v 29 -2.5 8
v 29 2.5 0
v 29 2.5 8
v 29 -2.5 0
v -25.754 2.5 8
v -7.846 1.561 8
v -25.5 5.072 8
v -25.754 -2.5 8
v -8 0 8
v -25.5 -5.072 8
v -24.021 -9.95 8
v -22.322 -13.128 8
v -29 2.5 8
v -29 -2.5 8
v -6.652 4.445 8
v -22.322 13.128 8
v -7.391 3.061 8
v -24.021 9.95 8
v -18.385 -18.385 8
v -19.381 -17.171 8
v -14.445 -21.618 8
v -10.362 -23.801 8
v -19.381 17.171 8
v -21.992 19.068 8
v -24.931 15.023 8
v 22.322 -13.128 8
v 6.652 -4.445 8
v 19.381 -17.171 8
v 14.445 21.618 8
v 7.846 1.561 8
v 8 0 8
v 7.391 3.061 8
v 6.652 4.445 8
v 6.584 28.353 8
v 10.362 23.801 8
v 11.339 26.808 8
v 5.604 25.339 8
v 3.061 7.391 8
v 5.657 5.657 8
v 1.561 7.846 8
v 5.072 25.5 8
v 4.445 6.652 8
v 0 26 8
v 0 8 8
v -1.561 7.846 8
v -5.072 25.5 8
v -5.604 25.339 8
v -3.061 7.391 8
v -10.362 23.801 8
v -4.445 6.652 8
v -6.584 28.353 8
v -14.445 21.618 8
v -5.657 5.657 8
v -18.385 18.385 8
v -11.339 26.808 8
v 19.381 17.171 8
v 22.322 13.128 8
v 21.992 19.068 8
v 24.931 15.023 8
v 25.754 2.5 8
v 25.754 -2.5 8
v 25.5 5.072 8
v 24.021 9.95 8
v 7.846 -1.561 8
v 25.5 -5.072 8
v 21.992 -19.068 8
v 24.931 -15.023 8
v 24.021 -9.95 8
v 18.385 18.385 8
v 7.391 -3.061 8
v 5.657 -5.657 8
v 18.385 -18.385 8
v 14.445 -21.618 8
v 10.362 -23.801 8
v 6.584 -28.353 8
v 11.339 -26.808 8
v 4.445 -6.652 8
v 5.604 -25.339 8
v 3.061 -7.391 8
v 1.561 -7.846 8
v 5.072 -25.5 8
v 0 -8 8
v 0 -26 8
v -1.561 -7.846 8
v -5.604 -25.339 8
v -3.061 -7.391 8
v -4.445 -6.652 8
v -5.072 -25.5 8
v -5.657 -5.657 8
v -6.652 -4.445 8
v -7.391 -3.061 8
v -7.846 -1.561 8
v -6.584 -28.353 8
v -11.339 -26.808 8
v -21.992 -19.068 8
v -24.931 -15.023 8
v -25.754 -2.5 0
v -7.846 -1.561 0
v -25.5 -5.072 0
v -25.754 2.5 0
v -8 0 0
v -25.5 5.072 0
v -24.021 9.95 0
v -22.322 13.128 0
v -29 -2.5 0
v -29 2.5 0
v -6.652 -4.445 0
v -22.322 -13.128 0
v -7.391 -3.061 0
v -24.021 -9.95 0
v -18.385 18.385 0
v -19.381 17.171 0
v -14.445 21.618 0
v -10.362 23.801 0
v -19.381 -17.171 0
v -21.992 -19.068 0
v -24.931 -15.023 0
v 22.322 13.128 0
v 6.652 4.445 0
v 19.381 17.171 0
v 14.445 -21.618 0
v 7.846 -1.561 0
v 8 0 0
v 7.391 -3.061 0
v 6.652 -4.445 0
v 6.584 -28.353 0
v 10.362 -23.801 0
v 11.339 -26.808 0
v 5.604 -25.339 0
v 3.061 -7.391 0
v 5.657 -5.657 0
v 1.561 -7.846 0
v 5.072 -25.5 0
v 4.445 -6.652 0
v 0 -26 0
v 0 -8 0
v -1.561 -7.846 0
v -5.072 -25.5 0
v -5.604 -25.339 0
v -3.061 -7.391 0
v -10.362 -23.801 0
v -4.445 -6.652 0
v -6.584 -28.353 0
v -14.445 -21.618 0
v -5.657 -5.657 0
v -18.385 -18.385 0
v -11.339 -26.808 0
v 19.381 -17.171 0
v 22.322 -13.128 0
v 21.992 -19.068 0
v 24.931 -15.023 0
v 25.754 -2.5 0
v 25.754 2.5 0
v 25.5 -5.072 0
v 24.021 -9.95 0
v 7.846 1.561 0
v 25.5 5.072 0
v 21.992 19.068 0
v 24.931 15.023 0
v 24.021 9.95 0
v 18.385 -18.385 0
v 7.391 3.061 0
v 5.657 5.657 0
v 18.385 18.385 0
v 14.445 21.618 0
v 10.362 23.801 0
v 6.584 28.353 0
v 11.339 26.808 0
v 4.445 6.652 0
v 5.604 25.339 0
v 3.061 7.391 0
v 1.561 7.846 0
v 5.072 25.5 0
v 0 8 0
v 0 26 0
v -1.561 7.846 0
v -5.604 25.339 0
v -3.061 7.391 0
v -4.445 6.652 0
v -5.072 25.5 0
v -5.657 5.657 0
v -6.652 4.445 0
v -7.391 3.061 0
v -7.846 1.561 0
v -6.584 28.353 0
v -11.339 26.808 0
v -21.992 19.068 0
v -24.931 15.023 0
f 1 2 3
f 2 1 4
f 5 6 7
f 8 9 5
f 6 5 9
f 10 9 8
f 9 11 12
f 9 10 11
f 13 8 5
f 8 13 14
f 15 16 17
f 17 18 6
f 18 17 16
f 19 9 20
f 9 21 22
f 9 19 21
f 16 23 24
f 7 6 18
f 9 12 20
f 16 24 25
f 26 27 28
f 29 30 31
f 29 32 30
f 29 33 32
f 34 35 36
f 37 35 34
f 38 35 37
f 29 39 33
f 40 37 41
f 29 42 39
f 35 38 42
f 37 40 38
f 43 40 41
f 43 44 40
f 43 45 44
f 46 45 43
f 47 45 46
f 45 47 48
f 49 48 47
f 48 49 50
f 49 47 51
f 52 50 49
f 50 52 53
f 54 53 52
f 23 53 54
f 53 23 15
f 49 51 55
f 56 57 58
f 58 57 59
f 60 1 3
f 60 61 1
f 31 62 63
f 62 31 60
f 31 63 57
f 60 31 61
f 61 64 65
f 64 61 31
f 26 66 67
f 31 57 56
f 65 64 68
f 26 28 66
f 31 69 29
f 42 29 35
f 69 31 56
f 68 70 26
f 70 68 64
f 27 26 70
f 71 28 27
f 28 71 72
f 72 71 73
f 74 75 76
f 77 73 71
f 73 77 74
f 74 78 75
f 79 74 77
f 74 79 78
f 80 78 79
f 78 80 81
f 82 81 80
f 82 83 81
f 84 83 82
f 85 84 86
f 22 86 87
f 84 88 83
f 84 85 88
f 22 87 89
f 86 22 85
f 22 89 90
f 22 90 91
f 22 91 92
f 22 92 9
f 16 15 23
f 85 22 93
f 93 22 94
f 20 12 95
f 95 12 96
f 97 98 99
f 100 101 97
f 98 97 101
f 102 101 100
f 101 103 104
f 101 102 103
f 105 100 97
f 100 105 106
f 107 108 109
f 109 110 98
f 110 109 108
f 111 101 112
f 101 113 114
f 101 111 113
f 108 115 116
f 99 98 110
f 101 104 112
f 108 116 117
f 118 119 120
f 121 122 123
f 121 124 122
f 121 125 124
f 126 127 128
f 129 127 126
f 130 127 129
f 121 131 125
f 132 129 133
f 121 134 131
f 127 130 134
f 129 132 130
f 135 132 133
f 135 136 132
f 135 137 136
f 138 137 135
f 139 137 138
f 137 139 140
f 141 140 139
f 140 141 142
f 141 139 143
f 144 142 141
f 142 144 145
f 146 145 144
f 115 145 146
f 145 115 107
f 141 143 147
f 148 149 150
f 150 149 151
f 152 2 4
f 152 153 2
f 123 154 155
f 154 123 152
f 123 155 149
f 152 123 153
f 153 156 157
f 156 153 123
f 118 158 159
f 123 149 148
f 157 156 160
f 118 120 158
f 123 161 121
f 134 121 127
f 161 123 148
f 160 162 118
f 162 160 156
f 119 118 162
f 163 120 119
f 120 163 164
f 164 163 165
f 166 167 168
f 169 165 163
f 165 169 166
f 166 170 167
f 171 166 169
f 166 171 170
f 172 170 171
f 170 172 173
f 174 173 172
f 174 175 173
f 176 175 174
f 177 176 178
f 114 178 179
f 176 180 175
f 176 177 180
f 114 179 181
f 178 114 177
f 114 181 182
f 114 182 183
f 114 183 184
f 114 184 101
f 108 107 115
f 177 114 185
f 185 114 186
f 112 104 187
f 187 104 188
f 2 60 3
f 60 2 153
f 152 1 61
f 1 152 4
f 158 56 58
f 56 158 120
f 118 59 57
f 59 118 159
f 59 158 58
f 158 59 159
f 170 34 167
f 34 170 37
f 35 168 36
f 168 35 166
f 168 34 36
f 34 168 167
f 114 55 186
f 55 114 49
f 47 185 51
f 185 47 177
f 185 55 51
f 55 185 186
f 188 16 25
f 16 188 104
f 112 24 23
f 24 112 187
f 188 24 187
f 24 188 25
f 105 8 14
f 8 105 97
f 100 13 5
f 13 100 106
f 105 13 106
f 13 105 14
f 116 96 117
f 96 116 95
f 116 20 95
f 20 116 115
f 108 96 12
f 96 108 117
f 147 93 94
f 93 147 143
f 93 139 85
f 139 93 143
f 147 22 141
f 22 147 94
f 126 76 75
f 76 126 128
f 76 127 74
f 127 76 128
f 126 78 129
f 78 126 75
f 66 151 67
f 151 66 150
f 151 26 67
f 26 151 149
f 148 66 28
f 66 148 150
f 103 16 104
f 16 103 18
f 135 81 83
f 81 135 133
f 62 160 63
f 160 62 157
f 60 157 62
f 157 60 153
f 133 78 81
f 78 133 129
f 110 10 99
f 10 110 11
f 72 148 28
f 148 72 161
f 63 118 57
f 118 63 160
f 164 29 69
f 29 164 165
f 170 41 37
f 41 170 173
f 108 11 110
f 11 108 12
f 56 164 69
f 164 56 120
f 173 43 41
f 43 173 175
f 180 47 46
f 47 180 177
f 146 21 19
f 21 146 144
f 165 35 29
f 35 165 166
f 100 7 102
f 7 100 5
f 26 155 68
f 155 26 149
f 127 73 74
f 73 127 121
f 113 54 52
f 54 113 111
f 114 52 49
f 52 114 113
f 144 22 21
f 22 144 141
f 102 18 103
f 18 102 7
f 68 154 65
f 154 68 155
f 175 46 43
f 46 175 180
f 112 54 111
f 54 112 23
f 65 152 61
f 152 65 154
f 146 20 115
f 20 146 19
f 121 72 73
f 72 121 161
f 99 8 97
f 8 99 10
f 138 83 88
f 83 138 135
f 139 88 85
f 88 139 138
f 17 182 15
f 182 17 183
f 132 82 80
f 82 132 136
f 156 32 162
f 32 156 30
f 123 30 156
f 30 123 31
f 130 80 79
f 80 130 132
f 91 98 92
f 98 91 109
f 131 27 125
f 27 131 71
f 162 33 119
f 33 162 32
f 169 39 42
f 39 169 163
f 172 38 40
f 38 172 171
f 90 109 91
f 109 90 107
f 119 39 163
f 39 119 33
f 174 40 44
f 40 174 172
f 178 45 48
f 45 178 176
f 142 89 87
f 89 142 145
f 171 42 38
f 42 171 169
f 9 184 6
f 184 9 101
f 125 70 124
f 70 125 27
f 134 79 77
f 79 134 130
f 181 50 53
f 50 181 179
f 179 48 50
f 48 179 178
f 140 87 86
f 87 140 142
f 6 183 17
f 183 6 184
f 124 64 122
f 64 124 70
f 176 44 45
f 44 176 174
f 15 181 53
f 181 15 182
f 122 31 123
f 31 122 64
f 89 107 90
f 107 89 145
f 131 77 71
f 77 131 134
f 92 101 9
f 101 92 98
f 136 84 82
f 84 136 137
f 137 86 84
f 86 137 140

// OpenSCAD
$fn = 32;

// ----------------------------------------------------------------------
// Spur blank: bored gear blank
// ----------------------------------------------------------------------

// --- parameters (mm) ---
disc_r = 26;              // blank root radius
disc_t = 8;               // blank thickness
n_teeth = 10;             // stub tooth count
tooth_w = 5;              // tooth width at the root
tooth_h = 3;              // tooth height above the root
bore_r = 8;               // central bore radius

out_r = disc_r + tooth_h;  // tip radius
bbox_x = 58.0;  // measured width over the teeth
bbox_y = 56.71;  // measured depth over the teeth

difference() {
union() {
  cylinder(r = disc_r, h = disc_t);
  for (i = [0 : n_teeth - 1])
    rotate([0, 0, i * 360 / n_teeth])
      translate([disc_r - 1, -tooth_w / 2, 0])
        cube([tooth_h + 1, tooth_w, disc_t]);
}
  translate([0, 0, -1]) cylinder(r = bore_r, h = disc_t + 2);
}
